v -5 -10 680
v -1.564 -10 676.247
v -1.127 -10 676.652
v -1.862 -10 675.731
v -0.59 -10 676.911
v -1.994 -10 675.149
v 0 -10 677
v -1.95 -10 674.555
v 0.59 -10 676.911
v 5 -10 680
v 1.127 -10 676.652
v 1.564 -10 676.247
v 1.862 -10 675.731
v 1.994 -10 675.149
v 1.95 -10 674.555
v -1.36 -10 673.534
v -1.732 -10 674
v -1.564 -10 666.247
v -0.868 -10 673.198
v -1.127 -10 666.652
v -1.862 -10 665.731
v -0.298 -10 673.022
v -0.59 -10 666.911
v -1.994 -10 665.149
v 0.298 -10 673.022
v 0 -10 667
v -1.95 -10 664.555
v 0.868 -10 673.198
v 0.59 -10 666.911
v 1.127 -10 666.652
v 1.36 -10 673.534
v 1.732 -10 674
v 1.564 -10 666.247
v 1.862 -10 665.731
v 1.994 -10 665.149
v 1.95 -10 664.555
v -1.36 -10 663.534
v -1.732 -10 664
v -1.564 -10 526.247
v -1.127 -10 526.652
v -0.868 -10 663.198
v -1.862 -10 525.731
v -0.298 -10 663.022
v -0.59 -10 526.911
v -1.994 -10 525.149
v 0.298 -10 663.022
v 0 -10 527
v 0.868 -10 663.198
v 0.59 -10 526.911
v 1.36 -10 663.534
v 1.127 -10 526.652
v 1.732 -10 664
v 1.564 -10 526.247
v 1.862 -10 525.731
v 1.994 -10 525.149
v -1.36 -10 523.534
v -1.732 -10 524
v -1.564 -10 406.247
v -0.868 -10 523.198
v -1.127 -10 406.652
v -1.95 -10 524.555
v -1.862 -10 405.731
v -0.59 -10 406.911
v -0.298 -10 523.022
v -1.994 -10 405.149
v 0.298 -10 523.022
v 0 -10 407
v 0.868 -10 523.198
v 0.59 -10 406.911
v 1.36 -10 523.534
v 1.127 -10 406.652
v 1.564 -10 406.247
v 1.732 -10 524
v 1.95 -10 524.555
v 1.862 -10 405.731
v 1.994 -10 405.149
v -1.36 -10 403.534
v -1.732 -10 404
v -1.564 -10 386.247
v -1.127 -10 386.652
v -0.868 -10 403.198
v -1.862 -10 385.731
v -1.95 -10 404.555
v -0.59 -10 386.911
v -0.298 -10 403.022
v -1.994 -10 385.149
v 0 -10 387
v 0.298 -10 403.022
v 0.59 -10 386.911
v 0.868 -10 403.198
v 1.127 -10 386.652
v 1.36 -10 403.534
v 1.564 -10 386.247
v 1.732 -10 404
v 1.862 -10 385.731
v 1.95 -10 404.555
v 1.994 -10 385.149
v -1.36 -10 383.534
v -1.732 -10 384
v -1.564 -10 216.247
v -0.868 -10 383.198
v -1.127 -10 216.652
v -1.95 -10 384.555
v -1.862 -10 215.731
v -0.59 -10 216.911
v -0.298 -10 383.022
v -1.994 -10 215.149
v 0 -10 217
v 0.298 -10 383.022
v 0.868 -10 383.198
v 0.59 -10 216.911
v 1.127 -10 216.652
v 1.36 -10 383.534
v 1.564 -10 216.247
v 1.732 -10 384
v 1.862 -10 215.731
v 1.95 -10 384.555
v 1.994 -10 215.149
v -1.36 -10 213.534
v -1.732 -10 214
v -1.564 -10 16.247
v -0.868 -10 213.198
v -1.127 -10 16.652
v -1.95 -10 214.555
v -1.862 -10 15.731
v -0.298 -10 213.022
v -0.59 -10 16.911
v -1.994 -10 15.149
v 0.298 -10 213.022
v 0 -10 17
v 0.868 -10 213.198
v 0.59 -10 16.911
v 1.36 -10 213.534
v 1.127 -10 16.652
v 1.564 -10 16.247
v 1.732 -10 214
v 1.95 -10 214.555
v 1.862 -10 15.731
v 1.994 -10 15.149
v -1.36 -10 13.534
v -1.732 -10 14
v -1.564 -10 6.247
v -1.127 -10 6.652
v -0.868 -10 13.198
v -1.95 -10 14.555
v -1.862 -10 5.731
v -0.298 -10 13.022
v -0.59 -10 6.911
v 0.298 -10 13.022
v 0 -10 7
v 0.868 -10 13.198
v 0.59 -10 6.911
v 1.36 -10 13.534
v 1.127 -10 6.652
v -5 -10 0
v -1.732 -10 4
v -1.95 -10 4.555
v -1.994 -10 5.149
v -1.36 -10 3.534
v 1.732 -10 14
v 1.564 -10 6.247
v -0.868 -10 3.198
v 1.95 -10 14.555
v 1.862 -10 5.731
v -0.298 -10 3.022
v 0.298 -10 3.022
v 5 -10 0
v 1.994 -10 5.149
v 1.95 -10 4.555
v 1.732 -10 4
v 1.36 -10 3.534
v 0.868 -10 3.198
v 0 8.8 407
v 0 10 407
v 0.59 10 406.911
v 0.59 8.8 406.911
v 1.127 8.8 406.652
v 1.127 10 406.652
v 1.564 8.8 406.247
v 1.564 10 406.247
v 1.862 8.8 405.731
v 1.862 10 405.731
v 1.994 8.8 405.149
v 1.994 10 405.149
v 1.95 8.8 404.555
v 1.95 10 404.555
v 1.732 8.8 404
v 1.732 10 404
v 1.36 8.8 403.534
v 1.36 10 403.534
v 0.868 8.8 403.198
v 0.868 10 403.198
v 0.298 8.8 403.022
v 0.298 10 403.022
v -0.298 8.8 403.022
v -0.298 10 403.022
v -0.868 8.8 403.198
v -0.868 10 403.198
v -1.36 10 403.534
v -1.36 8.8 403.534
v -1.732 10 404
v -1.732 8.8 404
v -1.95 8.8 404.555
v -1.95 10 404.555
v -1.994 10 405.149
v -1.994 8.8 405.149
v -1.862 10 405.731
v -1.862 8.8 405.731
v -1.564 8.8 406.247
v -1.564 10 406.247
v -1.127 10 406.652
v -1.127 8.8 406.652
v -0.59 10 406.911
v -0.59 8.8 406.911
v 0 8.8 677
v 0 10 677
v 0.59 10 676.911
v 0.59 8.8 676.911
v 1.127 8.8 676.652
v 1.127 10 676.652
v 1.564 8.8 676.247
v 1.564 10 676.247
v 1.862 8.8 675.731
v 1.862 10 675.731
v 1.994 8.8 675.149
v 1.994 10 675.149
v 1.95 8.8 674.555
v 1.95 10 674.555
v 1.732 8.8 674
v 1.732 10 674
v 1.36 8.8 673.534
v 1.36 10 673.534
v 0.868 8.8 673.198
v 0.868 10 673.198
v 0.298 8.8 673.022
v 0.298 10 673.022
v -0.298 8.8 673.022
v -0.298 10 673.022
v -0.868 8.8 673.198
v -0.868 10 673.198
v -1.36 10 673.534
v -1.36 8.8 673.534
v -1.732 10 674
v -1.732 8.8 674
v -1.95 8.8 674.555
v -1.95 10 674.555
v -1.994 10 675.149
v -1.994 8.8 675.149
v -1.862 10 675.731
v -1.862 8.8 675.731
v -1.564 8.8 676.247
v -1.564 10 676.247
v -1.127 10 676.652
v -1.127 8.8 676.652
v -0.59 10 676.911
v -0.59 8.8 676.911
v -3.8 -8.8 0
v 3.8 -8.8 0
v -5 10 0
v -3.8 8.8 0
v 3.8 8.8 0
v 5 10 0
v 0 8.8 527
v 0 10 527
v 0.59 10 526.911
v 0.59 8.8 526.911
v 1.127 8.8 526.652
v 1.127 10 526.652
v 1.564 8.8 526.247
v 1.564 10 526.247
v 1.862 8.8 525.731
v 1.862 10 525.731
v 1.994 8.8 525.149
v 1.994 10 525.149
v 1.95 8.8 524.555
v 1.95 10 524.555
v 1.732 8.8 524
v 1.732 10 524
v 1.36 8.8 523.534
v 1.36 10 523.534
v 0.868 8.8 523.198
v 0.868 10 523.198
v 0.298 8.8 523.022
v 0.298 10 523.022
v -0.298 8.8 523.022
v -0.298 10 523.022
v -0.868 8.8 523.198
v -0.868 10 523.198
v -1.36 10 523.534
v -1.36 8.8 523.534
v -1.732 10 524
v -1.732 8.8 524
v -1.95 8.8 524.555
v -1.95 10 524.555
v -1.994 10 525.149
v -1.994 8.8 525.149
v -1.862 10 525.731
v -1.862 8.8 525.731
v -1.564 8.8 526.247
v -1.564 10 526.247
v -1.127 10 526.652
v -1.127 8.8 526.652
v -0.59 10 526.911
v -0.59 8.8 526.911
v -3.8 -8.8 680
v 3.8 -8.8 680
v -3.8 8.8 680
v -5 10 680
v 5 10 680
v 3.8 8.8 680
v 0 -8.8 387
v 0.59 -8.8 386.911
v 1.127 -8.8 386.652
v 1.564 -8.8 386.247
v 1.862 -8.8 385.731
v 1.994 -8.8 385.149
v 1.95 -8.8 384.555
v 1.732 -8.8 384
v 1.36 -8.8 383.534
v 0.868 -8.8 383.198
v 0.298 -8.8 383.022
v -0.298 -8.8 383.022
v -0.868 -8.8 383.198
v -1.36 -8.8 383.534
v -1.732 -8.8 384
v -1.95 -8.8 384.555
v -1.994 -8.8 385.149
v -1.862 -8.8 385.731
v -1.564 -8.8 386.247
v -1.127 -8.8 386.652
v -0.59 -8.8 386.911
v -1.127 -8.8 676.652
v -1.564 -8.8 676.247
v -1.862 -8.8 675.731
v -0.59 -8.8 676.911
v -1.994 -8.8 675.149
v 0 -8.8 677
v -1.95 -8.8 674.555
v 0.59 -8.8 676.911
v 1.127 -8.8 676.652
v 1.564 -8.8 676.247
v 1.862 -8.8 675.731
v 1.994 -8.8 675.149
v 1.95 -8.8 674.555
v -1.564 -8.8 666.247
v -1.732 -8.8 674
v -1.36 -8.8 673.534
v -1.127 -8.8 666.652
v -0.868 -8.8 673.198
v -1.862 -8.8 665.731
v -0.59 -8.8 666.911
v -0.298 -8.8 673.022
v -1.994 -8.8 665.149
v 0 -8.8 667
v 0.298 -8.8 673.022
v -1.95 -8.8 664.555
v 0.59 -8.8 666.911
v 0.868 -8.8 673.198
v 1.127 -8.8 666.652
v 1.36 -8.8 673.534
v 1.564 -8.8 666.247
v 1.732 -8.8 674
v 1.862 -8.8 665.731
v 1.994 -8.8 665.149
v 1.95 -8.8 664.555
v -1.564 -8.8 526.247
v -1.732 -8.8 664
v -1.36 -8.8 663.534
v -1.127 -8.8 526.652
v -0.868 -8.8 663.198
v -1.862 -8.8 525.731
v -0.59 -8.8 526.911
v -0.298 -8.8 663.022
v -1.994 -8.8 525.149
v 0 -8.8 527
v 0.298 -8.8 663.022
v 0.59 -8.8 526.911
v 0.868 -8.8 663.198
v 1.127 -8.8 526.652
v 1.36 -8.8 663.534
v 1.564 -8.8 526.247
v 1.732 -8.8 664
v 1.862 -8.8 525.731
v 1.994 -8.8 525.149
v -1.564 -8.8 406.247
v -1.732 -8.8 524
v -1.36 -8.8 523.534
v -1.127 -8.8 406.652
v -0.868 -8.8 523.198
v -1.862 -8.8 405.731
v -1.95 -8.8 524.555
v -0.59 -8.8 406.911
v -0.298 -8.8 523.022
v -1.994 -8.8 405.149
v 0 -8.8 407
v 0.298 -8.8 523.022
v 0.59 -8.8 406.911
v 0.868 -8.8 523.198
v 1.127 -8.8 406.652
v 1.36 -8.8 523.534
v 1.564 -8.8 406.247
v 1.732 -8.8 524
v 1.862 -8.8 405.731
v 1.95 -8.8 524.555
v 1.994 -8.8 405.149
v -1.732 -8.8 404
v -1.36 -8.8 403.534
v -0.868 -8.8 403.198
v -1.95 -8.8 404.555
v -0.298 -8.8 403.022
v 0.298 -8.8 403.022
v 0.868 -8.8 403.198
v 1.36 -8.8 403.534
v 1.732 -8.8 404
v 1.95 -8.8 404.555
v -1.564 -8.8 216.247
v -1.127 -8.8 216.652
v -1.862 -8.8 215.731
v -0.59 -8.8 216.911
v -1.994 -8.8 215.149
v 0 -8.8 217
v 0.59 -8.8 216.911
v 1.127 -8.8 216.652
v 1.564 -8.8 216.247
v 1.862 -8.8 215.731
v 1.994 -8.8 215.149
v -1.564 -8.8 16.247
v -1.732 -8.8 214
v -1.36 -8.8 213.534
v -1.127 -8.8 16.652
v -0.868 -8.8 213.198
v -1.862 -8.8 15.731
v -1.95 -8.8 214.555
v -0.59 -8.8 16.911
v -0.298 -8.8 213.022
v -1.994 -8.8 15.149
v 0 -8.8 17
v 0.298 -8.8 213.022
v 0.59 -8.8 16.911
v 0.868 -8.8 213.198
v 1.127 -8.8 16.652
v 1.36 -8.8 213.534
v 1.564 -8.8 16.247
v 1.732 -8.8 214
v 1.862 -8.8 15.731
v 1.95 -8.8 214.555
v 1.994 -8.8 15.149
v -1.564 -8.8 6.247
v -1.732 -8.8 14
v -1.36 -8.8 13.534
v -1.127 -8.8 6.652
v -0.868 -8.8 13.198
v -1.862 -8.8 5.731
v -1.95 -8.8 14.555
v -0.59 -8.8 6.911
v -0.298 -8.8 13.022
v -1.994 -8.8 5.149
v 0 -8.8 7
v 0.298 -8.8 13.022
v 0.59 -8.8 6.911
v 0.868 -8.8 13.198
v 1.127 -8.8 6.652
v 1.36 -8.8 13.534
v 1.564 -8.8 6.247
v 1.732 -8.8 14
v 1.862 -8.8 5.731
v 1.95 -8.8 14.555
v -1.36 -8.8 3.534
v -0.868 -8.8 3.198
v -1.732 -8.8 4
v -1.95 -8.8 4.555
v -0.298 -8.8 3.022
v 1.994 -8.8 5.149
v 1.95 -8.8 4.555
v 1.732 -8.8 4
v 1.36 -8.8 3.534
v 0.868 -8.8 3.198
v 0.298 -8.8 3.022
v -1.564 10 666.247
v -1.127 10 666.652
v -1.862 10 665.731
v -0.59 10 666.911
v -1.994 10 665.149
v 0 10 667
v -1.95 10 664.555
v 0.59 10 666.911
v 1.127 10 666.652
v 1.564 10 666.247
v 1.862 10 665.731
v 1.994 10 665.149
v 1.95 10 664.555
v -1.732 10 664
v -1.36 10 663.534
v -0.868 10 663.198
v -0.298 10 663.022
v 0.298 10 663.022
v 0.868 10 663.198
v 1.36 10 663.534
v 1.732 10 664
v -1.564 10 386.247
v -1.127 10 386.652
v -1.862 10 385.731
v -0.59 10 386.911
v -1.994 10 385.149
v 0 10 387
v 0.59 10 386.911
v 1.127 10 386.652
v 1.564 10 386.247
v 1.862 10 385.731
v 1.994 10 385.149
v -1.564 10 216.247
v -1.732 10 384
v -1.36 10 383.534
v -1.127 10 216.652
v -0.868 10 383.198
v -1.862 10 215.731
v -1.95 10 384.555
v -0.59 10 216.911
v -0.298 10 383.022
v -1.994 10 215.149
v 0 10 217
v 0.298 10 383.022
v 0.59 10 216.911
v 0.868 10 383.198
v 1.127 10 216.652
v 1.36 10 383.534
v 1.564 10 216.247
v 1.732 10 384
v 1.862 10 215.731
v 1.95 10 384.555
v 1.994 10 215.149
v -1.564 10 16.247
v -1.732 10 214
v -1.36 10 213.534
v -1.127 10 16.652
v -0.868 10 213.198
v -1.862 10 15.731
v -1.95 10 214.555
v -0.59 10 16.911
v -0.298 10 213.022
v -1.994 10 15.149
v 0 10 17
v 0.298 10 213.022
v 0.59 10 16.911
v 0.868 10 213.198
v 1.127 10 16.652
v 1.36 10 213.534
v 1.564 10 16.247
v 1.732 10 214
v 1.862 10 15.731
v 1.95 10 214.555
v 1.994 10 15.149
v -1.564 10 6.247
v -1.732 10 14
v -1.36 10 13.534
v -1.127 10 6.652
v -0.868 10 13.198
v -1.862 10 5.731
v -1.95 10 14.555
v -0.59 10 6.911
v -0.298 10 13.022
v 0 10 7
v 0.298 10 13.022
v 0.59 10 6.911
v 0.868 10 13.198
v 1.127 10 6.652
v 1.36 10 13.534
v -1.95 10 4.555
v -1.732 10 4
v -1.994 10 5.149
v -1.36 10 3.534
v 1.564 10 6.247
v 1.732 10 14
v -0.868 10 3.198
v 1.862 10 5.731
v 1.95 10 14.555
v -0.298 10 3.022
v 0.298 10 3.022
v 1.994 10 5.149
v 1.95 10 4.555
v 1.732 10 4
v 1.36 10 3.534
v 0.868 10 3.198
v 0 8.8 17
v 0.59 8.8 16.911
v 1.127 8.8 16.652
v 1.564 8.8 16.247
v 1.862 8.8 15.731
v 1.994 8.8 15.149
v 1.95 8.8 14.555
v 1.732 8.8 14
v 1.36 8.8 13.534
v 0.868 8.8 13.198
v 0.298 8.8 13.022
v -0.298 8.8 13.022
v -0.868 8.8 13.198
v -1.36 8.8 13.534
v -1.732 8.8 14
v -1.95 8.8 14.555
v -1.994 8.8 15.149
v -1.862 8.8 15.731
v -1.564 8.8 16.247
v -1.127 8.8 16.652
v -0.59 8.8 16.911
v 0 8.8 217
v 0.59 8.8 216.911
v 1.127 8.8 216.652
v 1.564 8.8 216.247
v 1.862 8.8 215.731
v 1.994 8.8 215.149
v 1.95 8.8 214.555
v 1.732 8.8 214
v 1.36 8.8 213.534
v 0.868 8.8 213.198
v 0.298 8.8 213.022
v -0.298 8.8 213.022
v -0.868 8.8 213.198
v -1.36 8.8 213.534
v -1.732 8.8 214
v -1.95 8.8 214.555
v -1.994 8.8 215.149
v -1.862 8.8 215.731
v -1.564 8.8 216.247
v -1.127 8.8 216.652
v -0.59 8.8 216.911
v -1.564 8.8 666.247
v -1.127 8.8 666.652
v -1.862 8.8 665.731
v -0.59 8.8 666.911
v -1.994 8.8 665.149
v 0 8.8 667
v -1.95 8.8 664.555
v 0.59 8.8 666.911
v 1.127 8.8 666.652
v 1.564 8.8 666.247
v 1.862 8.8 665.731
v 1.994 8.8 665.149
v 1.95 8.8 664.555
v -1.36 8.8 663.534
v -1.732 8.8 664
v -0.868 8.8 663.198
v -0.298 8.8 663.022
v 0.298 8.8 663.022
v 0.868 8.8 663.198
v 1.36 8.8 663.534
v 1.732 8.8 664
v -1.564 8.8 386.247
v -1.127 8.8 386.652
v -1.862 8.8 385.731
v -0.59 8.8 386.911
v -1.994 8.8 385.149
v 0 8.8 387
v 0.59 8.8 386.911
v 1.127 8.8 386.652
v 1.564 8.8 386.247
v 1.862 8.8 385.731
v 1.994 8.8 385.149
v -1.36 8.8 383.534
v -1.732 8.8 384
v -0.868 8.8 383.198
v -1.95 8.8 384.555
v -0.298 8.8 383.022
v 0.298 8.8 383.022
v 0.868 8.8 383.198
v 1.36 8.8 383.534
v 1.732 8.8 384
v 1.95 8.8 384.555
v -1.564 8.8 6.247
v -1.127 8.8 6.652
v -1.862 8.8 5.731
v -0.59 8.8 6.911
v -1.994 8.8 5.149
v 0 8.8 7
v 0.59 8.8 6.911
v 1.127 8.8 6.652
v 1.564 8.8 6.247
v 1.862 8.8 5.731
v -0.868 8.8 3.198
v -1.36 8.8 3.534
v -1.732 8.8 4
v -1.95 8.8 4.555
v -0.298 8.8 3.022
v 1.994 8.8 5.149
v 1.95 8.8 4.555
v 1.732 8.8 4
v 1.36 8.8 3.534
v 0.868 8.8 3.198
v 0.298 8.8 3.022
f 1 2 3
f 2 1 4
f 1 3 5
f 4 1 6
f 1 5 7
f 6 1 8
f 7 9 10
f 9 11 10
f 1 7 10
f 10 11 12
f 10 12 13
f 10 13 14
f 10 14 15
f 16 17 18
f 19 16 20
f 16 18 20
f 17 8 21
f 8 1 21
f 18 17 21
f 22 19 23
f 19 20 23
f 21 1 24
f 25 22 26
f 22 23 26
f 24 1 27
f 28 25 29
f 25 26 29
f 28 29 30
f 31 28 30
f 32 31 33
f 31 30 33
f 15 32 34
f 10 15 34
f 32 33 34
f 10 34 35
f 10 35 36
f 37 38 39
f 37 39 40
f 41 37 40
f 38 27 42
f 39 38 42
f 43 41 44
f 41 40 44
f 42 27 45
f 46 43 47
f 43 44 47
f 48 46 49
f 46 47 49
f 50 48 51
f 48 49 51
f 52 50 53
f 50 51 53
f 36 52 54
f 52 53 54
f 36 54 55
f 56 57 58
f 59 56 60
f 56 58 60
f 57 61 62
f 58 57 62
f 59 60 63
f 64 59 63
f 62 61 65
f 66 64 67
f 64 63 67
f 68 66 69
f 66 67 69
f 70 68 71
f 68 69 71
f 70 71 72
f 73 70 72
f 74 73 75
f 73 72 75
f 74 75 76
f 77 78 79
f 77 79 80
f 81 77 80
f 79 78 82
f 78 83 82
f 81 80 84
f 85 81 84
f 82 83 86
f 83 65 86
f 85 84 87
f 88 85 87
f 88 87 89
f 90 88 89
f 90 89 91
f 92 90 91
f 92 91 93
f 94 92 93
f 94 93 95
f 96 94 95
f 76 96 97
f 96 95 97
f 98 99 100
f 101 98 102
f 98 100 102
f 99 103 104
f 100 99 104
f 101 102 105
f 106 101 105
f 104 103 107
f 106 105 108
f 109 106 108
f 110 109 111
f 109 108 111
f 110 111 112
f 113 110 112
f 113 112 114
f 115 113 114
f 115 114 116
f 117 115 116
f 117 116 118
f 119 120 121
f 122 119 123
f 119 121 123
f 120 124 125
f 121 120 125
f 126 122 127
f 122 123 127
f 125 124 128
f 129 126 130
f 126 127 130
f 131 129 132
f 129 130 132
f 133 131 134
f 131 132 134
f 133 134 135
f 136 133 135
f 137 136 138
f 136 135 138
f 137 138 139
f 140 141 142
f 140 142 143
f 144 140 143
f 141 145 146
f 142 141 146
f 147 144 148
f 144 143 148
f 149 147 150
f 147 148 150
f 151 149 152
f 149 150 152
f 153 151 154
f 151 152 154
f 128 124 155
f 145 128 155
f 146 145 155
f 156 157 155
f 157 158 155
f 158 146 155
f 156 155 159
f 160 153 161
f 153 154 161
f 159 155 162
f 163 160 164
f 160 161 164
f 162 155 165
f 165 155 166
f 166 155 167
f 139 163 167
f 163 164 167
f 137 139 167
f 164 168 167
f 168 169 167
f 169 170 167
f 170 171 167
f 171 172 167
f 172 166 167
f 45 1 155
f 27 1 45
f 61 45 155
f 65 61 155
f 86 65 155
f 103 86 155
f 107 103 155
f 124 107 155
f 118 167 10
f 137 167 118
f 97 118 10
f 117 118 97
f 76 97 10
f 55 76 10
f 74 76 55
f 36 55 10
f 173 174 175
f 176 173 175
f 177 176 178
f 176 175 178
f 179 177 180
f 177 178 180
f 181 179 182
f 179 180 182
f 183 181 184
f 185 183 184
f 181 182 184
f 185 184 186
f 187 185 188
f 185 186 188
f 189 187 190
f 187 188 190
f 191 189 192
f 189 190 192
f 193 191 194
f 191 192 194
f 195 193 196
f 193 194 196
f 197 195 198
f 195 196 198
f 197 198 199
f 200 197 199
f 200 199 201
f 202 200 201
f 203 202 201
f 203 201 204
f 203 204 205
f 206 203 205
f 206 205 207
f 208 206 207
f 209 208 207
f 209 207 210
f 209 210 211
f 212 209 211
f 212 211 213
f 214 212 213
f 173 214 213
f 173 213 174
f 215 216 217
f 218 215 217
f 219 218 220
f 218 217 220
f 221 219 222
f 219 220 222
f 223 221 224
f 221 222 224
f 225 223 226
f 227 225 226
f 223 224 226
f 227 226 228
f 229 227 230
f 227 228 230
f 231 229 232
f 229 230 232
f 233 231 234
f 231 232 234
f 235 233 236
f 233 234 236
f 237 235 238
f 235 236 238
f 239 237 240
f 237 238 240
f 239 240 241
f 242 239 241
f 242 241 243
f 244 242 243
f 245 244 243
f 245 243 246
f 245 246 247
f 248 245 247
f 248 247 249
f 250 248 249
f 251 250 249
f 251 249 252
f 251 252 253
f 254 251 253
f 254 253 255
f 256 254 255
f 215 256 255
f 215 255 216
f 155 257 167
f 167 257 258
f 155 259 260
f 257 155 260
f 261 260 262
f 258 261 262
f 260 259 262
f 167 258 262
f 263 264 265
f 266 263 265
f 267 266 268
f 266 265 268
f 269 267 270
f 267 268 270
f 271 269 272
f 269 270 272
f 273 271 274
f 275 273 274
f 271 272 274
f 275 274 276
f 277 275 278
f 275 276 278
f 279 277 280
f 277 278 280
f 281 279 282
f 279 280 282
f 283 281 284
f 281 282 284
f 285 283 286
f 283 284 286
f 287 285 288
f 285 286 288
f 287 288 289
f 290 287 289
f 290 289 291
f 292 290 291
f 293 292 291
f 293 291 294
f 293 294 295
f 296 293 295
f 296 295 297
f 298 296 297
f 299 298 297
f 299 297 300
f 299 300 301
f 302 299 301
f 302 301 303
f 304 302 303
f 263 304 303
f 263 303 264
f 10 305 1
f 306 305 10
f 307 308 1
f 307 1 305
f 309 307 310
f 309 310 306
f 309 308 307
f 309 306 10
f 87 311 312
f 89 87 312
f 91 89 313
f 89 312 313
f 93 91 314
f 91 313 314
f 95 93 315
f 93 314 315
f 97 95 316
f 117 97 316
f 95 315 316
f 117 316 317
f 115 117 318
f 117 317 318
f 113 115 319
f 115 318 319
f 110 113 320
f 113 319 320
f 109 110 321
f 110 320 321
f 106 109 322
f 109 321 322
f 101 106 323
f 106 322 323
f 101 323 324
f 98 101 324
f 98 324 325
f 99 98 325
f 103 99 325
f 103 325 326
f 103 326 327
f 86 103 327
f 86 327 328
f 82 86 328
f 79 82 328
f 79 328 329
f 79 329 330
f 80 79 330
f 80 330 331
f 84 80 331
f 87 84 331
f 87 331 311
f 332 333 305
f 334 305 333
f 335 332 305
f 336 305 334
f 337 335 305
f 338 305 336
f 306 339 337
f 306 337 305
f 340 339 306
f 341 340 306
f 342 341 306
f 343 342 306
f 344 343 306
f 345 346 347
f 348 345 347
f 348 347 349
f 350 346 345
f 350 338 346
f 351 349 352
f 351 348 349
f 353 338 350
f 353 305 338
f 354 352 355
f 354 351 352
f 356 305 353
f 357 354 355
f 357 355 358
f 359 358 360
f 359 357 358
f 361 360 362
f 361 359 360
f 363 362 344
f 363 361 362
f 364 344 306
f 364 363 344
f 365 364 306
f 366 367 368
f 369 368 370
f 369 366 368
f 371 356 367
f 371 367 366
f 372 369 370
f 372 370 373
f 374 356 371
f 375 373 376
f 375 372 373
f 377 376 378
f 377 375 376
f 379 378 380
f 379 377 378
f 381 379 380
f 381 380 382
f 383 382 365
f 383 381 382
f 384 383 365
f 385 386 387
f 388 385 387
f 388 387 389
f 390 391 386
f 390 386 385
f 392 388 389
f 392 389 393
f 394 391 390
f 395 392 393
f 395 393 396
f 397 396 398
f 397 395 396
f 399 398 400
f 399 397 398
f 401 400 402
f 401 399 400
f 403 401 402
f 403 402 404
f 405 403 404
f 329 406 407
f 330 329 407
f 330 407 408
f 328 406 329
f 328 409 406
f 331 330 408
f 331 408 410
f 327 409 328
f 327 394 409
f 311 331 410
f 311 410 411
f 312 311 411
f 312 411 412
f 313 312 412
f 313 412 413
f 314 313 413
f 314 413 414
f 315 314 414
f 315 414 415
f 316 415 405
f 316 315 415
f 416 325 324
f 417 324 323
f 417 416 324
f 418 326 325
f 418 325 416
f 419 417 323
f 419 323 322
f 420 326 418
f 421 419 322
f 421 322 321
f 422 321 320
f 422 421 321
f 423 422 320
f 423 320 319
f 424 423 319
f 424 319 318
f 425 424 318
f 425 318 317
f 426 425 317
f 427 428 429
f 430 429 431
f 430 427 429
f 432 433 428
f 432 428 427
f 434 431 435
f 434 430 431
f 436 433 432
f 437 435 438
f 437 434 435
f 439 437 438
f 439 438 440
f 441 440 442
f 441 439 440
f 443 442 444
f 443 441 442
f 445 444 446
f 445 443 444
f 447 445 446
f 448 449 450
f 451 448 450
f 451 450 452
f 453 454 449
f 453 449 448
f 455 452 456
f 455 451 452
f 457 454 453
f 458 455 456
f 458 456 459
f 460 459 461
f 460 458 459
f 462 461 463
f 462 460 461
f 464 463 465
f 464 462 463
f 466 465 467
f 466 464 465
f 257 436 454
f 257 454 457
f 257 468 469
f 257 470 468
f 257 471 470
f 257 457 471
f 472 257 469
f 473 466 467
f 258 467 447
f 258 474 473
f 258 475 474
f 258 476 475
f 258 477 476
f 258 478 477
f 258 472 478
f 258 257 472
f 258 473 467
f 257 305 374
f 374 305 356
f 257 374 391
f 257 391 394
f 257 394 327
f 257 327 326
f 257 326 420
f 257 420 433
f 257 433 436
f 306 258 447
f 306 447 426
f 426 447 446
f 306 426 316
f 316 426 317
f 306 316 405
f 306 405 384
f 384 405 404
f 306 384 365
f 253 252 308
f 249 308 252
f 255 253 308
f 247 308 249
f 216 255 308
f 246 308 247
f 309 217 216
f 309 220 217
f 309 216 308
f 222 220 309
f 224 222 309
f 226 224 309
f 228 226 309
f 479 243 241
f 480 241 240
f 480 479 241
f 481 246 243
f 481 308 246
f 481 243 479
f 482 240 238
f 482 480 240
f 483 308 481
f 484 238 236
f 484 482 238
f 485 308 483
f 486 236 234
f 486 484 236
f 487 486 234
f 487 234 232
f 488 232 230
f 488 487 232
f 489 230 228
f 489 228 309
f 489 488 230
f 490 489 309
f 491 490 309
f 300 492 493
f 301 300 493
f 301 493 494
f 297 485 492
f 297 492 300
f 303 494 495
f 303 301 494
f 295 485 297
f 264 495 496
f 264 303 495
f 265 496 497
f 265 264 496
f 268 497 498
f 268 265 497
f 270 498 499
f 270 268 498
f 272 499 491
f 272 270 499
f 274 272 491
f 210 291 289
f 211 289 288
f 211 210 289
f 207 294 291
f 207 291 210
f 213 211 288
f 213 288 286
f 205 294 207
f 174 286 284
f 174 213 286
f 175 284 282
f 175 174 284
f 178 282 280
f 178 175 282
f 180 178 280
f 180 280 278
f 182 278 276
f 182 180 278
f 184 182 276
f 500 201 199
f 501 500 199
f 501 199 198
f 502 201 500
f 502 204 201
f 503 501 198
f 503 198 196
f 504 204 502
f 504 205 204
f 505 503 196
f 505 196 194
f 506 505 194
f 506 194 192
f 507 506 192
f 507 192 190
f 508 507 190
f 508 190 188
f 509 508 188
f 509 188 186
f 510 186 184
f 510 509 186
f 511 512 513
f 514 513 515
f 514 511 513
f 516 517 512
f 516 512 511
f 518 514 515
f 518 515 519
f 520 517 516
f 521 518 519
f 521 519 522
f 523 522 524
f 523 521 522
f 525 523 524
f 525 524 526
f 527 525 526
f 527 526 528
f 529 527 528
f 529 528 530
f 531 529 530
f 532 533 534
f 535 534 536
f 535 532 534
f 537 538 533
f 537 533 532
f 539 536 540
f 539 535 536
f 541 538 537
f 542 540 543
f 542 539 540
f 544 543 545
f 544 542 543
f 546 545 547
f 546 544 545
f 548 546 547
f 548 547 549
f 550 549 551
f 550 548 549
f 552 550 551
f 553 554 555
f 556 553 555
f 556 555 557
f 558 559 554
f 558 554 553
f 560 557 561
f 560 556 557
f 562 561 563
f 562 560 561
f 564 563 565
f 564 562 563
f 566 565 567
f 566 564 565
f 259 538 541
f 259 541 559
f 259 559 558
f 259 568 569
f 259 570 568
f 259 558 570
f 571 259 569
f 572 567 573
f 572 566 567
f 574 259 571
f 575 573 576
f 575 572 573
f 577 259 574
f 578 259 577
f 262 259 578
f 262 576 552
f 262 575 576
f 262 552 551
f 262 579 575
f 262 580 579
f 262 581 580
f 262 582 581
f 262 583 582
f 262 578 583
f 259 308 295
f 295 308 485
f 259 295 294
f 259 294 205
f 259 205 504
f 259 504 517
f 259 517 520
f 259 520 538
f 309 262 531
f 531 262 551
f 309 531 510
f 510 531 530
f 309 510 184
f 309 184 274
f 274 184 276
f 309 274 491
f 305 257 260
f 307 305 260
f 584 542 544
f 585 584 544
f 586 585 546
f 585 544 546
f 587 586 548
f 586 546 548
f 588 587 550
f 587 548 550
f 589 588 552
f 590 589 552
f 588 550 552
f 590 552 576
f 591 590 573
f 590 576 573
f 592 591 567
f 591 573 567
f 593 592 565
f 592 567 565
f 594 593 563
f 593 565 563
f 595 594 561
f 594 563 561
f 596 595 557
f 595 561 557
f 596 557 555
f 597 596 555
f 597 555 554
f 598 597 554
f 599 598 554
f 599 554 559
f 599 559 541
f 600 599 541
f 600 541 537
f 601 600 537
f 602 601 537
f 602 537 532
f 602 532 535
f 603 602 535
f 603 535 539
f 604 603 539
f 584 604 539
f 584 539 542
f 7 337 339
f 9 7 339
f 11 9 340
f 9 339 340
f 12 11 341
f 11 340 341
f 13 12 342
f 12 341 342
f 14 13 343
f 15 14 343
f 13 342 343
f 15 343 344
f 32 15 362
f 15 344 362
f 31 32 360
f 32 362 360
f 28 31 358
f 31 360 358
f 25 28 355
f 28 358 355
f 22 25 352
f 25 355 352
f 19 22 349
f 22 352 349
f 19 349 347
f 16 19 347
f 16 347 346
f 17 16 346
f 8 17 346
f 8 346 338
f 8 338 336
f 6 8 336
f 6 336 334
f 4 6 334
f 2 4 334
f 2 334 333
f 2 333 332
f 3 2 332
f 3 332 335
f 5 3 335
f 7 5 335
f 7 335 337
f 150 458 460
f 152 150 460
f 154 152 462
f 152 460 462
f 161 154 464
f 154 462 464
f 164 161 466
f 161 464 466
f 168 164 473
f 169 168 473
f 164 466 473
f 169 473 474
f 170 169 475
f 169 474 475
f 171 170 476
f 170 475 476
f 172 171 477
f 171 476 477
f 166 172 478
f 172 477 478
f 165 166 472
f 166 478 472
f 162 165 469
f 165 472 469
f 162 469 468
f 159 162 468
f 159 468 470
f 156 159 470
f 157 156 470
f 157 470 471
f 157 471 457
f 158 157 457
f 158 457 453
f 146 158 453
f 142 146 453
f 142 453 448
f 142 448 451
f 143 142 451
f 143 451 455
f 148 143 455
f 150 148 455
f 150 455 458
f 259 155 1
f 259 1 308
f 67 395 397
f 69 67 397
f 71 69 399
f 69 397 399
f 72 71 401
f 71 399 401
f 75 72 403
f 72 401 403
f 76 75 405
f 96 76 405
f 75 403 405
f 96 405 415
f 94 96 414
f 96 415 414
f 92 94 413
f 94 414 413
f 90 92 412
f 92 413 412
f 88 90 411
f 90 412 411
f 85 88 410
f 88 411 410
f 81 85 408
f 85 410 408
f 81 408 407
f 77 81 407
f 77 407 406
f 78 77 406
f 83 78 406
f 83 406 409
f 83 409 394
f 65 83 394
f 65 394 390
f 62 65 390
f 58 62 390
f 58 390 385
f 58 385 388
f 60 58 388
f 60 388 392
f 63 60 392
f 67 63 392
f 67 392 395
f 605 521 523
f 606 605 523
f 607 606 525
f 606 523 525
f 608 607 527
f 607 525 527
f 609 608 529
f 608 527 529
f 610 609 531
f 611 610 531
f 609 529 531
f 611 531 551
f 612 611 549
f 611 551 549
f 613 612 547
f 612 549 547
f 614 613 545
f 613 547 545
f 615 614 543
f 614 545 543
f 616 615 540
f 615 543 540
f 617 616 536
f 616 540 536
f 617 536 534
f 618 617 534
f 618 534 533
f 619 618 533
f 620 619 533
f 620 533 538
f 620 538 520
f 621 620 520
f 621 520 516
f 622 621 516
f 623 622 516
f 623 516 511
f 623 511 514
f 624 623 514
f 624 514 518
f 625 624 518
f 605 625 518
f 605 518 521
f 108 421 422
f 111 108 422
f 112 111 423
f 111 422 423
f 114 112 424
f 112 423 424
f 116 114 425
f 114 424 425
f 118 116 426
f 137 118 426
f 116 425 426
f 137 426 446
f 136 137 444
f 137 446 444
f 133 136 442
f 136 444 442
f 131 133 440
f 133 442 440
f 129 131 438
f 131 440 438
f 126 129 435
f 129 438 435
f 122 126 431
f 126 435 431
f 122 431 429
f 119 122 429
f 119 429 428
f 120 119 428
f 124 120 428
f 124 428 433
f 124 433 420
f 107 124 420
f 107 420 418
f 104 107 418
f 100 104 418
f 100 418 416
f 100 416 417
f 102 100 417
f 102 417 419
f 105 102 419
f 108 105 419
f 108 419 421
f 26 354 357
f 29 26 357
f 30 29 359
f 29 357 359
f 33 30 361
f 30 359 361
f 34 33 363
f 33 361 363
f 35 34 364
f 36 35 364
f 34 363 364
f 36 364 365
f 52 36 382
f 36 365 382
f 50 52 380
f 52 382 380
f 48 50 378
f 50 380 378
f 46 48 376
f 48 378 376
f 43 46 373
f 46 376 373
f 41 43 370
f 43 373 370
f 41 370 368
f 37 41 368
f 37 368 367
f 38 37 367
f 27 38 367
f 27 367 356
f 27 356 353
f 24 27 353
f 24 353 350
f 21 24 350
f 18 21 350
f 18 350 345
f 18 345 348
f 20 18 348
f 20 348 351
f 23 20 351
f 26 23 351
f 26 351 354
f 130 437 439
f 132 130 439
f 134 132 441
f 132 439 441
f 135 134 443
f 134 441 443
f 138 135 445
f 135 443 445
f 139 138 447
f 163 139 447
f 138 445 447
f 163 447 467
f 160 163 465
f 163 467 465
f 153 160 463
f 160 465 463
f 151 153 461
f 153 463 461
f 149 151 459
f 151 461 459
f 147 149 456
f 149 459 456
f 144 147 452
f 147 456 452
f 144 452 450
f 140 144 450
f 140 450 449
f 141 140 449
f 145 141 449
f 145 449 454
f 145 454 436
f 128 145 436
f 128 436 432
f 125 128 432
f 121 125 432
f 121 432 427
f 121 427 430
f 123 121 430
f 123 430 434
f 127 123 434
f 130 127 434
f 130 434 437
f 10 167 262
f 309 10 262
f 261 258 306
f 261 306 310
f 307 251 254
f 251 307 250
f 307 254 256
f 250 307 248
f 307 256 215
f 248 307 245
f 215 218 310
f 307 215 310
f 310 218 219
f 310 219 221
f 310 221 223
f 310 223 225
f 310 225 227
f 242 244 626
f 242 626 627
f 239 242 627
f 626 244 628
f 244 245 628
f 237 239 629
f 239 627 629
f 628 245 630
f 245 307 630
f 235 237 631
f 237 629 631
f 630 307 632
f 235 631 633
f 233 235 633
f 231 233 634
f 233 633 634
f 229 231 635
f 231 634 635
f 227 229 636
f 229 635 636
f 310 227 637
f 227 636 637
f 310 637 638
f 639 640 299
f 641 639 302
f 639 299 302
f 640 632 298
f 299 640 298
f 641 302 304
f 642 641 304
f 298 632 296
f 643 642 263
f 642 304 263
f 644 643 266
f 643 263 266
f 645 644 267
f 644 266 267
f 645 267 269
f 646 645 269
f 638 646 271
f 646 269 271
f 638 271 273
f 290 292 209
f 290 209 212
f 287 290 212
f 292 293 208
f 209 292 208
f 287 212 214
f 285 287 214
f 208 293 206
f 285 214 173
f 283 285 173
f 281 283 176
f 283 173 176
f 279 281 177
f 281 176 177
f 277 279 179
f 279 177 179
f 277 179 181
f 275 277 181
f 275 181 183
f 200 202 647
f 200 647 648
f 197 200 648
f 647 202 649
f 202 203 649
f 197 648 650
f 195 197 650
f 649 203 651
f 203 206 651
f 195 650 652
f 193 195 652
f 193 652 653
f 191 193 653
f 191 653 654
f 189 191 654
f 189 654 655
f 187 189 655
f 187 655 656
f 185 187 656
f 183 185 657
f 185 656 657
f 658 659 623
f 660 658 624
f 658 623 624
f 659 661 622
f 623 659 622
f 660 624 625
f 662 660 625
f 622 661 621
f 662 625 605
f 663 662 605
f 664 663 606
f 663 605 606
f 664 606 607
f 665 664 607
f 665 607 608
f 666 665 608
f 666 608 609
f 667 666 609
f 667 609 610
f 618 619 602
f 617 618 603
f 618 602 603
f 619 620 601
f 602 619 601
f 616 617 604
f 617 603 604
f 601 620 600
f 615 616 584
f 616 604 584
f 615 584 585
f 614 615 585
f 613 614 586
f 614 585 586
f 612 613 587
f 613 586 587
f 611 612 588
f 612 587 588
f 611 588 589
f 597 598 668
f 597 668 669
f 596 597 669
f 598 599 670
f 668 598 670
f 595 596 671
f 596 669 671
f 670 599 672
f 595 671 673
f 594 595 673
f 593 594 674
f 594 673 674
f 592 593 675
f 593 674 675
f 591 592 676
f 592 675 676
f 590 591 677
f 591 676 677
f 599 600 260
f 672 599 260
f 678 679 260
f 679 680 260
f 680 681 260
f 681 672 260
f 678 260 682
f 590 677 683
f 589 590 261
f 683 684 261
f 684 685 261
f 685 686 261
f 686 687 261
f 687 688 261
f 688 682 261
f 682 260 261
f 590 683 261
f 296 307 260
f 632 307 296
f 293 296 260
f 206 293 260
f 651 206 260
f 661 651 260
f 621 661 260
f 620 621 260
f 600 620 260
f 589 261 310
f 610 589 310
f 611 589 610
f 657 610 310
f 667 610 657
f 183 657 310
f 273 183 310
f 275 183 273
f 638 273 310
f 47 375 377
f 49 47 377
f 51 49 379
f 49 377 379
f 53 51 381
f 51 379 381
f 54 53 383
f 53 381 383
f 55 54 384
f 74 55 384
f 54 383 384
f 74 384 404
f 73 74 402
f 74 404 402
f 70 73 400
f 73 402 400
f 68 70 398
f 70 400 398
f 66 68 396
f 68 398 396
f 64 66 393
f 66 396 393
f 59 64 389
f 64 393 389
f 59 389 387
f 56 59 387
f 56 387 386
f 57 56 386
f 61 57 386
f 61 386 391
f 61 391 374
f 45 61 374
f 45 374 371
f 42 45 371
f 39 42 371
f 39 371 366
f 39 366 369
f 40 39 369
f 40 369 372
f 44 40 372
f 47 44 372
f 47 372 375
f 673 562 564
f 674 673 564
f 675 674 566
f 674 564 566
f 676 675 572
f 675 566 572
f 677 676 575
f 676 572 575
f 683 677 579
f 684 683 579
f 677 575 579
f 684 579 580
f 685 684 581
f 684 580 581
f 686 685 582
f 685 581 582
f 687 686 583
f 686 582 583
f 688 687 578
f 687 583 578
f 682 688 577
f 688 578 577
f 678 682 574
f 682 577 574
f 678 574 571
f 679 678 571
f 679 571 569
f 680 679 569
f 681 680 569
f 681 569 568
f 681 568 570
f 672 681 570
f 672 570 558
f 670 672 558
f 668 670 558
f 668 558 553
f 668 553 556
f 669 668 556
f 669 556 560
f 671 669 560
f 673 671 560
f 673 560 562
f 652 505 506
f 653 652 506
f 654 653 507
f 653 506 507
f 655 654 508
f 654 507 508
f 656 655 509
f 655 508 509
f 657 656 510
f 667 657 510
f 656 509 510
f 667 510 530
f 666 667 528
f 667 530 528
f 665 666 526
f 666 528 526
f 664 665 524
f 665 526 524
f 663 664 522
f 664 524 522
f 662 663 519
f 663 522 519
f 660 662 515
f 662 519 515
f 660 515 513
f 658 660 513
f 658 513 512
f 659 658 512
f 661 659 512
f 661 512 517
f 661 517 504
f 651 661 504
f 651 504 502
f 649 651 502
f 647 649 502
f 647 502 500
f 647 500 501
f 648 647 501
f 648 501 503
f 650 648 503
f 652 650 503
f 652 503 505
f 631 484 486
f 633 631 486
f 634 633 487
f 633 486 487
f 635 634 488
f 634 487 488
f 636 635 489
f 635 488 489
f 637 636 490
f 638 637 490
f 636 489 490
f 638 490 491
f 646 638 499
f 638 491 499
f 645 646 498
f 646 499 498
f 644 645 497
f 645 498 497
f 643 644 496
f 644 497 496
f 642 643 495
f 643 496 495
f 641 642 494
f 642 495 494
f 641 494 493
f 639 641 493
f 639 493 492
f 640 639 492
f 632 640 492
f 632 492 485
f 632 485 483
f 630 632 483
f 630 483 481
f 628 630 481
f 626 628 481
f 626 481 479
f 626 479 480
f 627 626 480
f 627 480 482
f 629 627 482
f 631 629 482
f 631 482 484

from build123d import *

# Parameters (mm, degrees)
SKETCH_1_W          = 10
SKETCH_1_H          = 20
SKETCH_1_W_2        = 7.6
SKETCH_1_H_2        = 17.6
EXTRUDE_1_DEPTH     = 680
SKETCH_2_R          = 2
CUT_EXTRUDE_1_DEPTH = 681.312428227


with BuildPart() as part:
    # ｽｹｯﾁ1 → 押し出し-薄板1 (new body)
    with BuildSketch(Plane.XY):
        Rectangle(SKETCH_1_W, SKETCH_1_H)
        Rectangle(SKETCH_1_W_2, SKETCH_1_H_2, mode=Mode.SUBTRACT)
    extrude(amount=EXTRUDE_1_DEPTH)

    # ｽｹｯﾁ2 → ｶｯﾄ - 押し出し1 (cut, through all)
    with BuildSketch(Plane(origin=(0, 10, 0), x_dir=(1, 0, 0), z_dir=(0, 1, 0))):
        with Locations(Location((0, -665, 0), (0, 0, 270))):
            Circle(SKETCH_2_R)
        with Locations(Location((0, -675, 0), (0, 0, 270))):
            Circle(SKETCH_2_R)
        with Locations(Location((0, -5, 0), (0, 0, 270))):
            Circle(SKETCH_2_R)
        with Locations(Location((0, -15, 0), (0, 0, 270))):
            Circle(SKETCH_2_R)
        with Locations(Location((0, -525, 0), (0, 0, 270))):
            Circle(SKETCH_2_R)
        with Locations(Location((0, -405, 0), (0, 0, 270))):
            Circle(SKETCH_2_R)
        with Locations(Location((0, -215, 0), (0, 0, 270))):
            Circle(SKETCH_2_R)
        with Locations(Location((0, -385, 0), (0, 0, 270))):
            Circle(SKETCH_2_R)
    extrude(amount=-CUT_EXTRUDE_1_DEPTH, mode=Mode.SUBTRACT)


solid = part.part
